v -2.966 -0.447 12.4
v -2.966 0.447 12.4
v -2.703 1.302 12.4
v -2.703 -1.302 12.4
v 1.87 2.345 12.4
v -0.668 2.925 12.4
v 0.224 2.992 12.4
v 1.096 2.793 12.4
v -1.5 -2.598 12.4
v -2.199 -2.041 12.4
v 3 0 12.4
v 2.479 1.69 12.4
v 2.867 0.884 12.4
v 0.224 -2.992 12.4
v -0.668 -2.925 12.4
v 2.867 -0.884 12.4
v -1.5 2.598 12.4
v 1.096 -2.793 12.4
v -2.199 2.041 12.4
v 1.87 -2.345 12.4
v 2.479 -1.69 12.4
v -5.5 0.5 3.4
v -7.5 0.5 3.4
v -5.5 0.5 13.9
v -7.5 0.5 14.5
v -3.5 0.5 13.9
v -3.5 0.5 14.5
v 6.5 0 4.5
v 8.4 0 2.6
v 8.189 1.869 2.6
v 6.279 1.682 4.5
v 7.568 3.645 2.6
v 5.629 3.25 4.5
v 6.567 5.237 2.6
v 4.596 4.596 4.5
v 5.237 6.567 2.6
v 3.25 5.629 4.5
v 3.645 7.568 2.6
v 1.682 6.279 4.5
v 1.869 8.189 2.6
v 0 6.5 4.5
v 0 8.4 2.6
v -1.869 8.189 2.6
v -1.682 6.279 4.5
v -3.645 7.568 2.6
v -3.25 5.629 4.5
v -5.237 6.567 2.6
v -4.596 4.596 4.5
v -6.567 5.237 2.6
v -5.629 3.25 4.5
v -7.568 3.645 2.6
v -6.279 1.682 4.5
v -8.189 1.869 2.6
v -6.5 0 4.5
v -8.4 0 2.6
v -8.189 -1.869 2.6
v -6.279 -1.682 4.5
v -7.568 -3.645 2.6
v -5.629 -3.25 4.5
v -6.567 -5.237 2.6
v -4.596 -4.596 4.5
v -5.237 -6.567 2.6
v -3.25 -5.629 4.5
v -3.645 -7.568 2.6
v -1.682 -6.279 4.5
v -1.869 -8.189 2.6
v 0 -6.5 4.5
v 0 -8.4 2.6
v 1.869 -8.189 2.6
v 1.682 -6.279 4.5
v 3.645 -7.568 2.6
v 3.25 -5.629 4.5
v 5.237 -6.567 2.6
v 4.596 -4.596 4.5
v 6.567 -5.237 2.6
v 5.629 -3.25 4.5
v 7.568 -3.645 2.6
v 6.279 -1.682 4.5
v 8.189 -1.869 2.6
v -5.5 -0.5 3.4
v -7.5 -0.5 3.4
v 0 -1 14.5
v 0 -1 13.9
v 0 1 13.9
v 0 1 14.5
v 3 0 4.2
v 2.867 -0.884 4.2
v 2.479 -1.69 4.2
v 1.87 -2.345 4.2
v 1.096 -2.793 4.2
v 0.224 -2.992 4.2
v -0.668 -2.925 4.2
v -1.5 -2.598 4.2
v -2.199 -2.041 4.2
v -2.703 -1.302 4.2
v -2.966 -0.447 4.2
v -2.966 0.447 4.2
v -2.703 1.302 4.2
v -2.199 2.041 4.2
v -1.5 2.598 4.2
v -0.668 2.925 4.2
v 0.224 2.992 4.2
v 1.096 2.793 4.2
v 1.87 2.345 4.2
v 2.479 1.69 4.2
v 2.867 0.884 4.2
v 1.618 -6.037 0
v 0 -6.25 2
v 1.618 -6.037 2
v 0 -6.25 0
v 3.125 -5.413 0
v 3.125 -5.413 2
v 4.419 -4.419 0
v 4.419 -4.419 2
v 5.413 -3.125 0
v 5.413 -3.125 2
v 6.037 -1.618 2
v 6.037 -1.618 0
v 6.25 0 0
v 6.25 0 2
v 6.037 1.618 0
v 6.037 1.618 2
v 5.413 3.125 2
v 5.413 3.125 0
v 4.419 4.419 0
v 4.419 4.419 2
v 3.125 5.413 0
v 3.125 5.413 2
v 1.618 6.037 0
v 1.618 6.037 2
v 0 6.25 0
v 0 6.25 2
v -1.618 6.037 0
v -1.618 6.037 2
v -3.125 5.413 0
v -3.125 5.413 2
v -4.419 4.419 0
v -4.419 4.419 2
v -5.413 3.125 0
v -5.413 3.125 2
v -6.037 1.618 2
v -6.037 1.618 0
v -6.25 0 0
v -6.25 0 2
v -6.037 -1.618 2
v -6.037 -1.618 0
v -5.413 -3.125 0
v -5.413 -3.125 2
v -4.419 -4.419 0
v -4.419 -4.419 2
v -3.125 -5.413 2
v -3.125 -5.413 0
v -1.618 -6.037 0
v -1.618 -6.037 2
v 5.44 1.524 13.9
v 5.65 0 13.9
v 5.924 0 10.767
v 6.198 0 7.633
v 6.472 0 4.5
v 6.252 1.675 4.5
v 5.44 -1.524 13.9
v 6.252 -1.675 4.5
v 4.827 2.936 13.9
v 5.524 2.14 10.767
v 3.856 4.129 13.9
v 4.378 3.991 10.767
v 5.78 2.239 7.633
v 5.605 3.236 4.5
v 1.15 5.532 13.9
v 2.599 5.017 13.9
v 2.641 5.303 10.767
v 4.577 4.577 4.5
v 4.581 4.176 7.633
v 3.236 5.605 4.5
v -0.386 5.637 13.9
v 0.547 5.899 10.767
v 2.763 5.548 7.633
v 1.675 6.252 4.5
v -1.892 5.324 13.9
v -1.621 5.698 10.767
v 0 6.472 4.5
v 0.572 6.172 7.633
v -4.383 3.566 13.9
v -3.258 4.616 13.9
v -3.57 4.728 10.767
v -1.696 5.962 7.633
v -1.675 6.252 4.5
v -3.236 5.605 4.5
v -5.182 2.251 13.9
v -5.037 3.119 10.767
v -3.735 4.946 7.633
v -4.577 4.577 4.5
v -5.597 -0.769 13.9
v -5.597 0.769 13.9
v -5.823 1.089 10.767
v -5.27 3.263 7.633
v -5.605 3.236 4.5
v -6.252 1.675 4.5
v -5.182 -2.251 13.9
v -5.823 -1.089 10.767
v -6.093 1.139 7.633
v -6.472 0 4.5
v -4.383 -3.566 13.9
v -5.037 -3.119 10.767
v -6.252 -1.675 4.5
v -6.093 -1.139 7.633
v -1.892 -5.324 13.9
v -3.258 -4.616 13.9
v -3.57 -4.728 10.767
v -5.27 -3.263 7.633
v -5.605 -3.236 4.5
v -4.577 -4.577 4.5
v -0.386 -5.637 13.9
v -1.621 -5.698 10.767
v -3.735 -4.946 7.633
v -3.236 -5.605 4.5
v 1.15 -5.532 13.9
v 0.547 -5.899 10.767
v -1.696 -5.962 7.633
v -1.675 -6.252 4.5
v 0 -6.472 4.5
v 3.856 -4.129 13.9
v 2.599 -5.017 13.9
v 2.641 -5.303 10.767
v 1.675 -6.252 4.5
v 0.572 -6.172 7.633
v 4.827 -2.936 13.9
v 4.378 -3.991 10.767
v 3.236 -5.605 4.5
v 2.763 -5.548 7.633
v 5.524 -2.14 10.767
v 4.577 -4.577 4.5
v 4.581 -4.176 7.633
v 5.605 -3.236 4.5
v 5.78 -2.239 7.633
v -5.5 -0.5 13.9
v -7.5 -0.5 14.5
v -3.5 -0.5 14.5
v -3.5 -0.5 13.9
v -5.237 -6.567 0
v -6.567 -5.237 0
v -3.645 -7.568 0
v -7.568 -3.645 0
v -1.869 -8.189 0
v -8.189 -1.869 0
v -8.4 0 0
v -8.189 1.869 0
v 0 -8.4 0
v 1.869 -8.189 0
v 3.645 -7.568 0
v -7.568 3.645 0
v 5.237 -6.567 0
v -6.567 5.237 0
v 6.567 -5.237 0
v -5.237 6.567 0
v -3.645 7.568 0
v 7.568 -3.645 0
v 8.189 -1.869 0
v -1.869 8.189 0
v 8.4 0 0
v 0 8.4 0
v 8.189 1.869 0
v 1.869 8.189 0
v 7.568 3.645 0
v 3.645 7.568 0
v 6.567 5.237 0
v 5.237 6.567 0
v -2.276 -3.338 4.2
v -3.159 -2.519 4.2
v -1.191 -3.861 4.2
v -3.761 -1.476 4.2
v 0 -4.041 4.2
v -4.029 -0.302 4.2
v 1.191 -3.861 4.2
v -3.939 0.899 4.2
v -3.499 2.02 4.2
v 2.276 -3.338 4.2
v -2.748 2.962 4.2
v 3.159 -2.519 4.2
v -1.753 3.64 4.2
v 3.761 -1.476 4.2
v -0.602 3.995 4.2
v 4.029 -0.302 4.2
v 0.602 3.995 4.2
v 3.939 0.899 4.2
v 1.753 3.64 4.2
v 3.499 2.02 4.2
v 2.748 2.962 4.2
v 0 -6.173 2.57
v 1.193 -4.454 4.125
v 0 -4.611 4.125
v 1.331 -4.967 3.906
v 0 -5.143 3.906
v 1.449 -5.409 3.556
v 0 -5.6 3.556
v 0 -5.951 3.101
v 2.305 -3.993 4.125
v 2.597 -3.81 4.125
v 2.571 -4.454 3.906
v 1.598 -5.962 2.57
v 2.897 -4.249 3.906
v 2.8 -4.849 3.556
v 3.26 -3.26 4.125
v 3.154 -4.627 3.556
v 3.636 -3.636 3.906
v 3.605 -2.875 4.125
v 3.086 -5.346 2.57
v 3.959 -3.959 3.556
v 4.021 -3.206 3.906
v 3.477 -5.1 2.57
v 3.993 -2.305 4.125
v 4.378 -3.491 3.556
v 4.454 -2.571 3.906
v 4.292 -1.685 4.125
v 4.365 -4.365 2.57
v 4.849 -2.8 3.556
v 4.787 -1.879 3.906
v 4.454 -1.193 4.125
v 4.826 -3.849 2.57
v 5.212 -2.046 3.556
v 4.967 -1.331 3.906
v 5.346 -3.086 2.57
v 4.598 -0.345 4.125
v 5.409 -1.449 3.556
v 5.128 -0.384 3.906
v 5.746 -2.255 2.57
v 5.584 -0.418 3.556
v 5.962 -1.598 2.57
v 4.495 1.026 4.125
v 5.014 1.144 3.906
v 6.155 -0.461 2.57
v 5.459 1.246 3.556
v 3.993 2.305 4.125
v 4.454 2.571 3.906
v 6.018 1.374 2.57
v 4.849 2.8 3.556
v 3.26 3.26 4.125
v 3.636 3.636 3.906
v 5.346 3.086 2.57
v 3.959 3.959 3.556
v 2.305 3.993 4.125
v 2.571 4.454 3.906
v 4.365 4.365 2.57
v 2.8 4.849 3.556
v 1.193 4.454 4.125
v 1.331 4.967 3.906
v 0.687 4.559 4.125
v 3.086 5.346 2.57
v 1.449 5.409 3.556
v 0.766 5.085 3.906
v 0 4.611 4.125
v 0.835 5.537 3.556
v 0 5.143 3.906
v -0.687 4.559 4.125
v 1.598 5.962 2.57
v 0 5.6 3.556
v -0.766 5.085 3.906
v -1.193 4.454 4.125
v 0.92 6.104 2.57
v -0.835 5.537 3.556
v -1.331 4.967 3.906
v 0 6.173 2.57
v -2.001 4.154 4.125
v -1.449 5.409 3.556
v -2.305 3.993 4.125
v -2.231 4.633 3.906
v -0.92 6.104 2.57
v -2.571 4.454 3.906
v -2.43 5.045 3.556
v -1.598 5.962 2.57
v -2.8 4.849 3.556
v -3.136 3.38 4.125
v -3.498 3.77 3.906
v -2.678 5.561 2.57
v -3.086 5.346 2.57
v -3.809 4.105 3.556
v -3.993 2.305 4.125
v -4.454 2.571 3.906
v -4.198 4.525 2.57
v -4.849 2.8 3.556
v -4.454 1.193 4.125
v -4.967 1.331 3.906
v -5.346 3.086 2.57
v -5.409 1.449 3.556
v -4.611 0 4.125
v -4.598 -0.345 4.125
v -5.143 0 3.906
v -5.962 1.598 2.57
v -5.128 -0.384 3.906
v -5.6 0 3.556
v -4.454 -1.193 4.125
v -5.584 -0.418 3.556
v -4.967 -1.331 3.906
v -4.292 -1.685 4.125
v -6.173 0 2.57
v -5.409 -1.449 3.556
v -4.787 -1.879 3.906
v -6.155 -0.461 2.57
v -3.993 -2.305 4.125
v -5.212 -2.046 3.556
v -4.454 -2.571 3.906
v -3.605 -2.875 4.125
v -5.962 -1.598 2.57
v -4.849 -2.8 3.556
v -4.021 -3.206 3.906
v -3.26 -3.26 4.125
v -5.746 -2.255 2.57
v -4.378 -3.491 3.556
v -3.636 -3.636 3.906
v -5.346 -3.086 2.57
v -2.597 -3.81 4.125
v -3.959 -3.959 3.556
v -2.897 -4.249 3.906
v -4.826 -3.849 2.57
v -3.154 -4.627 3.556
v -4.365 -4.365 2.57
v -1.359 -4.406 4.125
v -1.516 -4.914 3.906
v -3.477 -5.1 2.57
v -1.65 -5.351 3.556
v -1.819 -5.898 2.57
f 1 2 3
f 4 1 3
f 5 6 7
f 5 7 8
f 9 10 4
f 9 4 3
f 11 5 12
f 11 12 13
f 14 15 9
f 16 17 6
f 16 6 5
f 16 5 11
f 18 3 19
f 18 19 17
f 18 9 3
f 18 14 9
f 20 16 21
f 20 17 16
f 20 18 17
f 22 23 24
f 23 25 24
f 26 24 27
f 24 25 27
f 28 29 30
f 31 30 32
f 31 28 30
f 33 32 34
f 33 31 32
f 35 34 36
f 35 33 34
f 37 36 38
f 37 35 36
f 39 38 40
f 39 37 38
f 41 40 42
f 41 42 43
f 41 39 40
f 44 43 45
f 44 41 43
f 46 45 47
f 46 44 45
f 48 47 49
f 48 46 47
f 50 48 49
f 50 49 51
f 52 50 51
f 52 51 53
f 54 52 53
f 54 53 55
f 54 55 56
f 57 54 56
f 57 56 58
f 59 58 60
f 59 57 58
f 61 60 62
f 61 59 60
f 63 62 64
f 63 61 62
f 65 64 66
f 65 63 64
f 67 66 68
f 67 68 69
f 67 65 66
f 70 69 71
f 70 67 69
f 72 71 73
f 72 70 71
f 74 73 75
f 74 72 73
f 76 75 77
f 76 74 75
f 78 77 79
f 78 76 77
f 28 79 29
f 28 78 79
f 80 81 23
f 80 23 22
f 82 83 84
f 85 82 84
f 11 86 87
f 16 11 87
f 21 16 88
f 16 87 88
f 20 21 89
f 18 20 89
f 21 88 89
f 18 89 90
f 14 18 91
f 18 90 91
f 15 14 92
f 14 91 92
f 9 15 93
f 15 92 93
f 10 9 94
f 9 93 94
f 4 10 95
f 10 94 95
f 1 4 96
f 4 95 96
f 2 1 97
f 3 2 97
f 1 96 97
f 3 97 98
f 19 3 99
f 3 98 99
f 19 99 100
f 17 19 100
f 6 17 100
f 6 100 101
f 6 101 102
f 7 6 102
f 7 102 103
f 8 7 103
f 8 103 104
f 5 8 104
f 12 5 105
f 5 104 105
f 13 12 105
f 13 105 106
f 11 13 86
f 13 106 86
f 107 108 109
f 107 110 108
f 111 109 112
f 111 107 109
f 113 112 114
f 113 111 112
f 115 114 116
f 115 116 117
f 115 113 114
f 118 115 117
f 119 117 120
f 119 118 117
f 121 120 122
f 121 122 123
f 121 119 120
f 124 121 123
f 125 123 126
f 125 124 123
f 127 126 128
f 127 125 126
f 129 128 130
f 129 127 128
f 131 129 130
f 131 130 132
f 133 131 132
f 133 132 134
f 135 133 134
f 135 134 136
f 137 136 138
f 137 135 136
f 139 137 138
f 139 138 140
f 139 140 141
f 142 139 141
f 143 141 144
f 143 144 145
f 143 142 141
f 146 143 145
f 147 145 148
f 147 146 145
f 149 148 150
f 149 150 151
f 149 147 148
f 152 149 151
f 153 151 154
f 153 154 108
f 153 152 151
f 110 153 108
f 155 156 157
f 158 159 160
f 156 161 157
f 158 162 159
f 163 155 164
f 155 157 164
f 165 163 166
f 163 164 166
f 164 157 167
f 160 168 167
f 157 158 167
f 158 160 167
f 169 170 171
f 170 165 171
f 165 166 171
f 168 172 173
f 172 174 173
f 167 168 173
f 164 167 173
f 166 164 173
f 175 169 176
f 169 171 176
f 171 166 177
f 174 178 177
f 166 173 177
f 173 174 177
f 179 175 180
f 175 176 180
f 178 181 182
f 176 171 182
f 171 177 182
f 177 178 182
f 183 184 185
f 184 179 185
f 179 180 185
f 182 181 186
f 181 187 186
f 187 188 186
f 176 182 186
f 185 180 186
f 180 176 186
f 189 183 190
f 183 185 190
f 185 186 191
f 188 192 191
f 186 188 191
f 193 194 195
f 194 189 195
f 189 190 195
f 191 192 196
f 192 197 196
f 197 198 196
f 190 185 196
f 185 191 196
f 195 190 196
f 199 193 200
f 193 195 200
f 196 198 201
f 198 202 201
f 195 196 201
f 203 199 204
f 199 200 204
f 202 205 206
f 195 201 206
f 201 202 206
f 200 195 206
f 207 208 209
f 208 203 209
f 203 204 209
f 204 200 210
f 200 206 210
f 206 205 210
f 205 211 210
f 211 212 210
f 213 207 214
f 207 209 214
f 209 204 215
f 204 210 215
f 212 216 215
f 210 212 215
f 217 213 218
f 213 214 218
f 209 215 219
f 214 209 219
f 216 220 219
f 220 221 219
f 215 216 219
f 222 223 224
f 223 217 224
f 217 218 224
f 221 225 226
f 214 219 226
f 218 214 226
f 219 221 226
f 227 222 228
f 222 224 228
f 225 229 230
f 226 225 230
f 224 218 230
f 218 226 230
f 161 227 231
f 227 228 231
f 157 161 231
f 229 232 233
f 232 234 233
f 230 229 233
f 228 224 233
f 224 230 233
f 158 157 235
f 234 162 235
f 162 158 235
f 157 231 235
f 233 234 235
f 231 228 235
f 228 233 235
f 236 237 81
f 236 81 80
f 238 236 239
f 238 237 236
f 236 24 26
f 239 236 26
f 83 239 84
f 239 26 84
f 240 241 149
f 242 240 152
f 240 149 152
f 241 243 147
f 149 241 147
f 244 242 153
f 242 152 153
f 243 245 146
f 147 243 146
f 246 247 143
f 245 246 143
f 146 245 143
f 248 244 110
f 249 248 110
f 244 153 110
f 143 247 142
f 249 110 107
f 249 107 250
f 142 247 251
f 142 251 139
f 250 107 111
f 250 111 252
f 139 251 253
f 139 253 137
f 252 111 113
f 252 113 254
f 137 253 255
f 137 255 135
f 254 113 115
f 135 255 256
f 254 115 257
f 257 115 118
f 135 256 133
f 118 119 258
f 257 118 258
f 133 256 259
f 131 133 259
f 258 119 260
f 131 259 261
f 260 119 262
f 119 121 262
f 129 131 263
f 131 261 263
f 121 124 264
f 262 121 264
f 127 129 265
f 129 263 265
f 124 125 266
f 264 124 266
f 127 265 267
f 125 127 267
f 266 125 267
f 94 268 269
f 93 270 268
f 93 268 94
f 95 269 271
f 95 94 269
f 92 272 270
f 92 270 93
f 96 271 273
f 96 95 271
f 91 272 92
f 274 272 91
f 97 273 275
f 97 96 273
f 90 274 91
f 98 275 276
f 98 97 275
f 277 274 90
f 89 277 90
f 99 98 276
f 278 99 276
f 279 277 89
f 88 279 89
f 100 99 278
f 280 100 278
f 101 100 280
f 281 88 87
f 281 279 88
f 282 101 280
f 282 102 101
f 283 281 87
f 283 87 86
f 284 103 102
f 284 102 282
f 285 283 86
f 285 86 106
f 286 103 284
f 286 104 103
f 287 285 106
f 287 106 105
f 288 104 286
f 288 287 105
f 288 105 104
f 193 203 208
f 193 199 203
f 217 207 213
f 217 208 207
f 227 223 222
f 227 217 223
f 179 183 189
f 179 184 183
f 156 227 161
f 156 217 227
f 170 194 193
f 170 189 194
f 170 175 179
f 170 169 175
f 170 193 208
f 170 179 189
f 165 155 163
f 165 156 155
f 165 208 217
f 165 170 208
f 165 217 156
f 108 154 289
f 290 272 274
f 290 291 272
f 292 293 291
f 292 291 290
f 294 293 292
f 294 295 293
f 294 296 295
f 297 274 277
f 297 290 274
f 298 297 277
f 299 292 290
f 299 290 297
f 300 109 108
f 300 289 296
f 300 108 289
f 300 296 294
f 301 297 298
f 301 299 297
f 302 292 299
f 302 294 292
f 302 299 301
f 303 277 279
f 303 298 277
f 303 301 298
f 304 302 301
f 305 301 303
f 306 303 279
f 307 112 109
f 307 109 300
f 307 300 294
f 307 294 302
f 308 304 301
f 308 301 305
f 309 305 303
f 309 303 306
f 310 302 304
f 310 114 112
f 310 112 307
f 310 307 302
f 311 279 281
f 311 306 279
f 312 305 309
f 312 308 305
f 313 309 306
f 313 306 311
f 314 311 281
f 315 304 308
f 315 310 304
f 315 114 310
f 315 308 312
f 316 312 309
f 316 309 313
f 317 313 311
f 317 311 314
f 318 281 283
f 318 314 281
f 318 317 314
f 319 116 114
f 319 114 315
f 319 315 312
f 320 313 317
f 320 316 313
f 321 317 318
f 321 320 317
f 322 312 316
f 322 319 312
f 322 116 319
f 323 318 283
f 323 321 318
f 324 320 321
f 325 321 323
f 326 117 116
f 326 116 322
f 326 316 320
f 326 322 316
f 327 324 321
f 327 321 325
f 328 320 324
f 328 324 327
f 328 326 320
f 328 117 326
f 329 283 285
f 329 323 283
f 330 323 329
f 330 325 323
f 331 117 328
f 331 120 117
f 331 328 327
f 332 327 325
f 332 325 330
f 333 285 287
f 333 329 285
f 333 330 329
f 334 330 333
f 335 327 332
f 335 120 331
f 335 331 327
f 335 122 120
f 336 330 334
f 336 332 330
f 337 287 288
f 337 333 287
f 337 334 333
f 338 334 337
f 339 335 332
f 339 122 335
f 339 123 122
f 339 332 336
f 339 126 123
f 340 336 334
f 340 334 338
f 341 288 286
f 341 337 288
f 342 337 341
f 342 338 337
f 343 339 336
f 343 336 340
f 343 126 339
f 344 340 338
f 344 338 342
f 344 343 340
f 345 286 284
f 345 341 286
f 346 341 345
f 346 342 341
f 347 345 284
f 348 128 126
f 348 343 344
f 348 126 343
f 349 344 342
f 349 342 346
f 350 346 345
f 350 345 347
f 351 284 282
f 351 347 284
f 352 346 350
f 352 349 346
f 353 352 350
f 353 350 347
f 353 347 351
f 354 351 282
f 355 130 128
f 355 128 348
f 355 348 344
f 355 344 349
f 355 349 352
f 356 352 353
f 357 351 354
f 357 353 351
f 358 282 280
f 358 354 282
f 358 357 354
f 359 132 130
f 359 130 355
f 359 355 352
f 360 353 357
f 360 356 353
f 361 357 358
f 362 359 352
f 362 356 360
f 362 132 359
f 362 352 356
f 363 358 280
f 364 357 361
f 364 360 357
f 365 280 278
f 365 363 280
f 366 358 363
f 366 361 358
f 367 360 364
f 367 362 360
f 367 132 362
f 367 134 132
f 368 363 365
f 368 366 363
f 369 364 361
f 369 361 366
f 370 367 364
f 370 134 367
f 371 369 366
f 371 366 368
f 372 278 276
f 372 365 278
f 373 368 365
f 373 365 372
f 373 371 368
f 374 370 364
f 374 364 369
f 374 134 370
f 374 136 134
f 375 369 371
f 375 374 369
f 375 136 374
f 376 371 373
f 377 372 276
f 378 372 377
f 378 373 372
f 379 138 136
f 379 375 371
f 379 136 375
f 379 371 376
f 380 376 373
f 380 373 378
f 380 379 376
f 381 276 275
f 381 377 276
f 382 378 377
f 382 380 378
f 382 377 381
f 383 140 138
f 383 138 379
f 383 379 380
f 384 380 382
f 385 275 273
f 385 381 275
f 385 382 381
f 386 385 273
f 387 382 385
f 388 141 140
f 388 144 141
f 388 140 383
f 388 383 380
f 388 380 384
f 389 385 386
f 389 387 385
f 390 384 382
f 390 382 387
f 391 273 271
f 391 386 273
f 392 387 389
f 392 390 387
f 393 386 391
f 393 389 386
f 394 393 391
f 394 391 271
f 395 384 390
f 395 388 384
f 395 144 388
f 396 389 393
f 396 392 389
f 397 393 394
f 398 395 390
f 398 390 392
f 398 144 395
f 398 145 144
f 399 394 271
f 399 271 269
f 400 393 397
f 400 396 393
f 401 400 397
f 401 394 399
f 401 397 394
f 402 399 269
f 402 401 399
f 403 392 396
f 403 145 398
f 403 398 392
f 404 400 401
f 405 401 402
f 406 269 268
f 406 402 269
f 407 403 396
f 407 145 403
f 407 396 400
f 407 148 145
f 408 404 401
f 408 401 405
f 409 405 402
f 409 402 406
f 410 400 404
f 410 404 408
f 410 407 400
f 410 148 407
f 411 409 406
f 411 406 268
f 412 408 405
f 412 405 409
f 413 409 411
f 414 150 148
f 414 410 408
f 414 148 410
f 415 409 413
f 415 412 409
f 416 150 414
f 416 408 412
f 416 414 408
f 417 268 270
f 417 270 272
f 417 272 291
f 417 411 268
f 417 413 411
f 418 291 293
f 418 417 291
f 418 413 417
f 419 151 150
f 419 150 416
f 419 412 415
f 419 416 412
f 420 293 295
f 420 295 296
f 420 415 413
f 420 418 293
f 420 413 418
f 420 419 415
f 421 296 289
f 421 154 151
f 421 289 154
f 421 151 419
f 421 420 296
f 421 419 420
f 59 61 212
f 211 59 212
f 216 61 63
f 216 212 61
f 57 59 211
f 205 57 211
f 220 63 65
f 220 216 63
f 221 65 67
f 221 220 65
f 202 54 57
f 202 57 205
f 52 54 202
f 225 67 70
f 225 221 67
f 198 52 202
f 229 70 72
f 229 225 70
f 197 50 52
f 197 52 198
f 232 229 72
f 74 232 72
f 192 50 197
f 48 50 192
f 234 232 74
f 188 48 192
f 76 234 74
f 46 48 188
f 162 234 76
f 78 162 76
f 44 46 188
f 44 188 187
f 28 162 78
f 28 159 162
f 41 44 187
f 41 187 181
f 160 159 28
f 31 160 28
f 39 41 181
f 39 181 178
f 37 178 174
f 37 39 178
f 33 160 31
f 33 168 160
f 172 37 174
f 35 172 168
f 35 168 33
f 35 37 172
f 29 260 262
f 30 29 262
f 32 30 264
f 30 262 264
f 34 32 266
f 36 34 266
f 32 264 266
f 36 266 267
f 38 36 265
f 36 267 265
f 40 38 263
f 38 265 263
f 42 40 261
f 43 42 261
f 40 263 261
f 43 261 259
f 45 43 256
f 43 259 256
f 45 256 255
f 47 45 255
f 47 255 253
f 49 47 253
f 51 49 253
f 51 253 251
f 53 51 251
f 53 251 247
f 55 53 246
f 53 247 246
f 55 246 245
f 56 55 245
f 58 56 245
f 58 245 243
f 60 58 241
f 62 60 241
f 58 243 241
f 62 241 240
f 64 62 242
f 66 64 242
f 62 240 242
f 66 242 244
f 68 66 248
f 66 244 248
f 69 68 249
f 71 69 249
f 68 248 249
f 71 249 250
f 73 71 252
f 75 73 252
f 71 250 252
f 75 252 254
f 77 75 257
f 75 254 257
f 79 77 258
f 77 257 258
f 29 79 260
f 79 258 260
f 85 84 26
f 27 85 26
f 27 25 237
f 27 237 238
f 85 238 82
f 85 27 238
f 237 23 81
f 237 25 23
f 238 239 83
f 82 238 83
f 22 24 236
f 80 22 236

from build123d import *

# Parameters (mm, degrees)
F0_R      = 8.4
F1_DEPTH  = 4.5
F3_R      = 5.65
F4_DEPTH  = 9.4
F4_TAPER  = -5
F5_SIZE   = 1.9
F7_DEPTH  = 0.6
F8_W      = 2
F8_H      = 1
F9_DEPTH  = 10.5
F12_R     = 3
F13_DEPTH = 8.2


with BuildPart() as f1:
    # F0 (on Top) → F1 (new body)
    with BuildSketch(Plane.XY):
        Circle(F0_R)
    extrude(amount=F1_DEPTH)

    # F3 (on offset) → F4 (join, through all)
    with BuildSketch(Plane.XY.offset(13.9)):
        Circle(F3_R)
    extrude(amount=-F4_DEPTH, taper=F4_TAPER)

    # F5
    f5_edges = [f1.edges().sort_by_distance(p)[0] for p in [
        (-8.4, 0, 4.5),
    ]]
    chamfer(f5_edges, length=F5_SIZE)

    # F10 (on Right) → F11 (revolve, cut)
    with BuildSketch(Plane.YZ):
        with BuildLine():
            Line((-6.25, 2), (-6.25, 0))
            Line((-6.25, 0), (0, 0))
            Line((0, 0), (0, 4.2))
            Line((0, 4.2), (-4.0405227408, 4.2))
            ThreePointArc((-4.0405227408, 4.2), (-5.5995119774, 3.5562074482), (-6.25, 2))
        make_face()
    revolve(axis=Axis((0, 0, 2.1), (0, 0, 1)), mode=Mode.SUBTRACT)

    # F12 (on face) → F13 (cut)
    with BuildSketch(Plane(origin=(0, 0, 4.2), x_dir=(1, 0, 0), z_dir=(0, 0, -1))):
        Circle(F12_R)
    extrude(amount=-F13_DEPTH, mode=Mode.SUBTRACT)


with BuildPart() as f7:
    # F6 (on face) → F7 (new body)
    with BuildSketch(Plane.XY.offset(13.9)):
        with BuildLine():
            ThreePointArc((-5.6278326201, -0.5), (-5.65, 0), (-5.6278326201, 0.5))
            Line((-5.6278326201, 0.5), (-7.5, 0.5))
            Line((-7.5, 0.5), (-7.5, -0.5))
            Line((-7.5, -0.5), (-5.6278326201, -0.5))
        make_face()
        with BuildLine():
            Line((0, -1), (0, 1))
            Line((0, 1), (-3.5, 0.5))
            Line((-3.5, 0.5), (-5.6278326201, 0.5))
            ThreePointArc((-5.6278326201, 0.5), (-5.65, 0), (-5.6278326201, -0.5))
            Line((-5.6278326201, -0.5), (-3.5, -0.5))
            Line((-3.5, -0.5), (0, -1))
        make_face()
    extrude(amount=F7_DEPTH)

    # F8 (on face) → F9 (join)
    with BuildSketch(Plane(origin=(0, 0, 13.9), x_dir=(1, 0, 0), z_dir=(0, 0, -1))):
        with Locations((-6.5, 0)):
            Rectangle(F8_W, F8_H)
    extrude(amount=F9_DEPTH)


solid = Compound([f1.part, f7.part])
